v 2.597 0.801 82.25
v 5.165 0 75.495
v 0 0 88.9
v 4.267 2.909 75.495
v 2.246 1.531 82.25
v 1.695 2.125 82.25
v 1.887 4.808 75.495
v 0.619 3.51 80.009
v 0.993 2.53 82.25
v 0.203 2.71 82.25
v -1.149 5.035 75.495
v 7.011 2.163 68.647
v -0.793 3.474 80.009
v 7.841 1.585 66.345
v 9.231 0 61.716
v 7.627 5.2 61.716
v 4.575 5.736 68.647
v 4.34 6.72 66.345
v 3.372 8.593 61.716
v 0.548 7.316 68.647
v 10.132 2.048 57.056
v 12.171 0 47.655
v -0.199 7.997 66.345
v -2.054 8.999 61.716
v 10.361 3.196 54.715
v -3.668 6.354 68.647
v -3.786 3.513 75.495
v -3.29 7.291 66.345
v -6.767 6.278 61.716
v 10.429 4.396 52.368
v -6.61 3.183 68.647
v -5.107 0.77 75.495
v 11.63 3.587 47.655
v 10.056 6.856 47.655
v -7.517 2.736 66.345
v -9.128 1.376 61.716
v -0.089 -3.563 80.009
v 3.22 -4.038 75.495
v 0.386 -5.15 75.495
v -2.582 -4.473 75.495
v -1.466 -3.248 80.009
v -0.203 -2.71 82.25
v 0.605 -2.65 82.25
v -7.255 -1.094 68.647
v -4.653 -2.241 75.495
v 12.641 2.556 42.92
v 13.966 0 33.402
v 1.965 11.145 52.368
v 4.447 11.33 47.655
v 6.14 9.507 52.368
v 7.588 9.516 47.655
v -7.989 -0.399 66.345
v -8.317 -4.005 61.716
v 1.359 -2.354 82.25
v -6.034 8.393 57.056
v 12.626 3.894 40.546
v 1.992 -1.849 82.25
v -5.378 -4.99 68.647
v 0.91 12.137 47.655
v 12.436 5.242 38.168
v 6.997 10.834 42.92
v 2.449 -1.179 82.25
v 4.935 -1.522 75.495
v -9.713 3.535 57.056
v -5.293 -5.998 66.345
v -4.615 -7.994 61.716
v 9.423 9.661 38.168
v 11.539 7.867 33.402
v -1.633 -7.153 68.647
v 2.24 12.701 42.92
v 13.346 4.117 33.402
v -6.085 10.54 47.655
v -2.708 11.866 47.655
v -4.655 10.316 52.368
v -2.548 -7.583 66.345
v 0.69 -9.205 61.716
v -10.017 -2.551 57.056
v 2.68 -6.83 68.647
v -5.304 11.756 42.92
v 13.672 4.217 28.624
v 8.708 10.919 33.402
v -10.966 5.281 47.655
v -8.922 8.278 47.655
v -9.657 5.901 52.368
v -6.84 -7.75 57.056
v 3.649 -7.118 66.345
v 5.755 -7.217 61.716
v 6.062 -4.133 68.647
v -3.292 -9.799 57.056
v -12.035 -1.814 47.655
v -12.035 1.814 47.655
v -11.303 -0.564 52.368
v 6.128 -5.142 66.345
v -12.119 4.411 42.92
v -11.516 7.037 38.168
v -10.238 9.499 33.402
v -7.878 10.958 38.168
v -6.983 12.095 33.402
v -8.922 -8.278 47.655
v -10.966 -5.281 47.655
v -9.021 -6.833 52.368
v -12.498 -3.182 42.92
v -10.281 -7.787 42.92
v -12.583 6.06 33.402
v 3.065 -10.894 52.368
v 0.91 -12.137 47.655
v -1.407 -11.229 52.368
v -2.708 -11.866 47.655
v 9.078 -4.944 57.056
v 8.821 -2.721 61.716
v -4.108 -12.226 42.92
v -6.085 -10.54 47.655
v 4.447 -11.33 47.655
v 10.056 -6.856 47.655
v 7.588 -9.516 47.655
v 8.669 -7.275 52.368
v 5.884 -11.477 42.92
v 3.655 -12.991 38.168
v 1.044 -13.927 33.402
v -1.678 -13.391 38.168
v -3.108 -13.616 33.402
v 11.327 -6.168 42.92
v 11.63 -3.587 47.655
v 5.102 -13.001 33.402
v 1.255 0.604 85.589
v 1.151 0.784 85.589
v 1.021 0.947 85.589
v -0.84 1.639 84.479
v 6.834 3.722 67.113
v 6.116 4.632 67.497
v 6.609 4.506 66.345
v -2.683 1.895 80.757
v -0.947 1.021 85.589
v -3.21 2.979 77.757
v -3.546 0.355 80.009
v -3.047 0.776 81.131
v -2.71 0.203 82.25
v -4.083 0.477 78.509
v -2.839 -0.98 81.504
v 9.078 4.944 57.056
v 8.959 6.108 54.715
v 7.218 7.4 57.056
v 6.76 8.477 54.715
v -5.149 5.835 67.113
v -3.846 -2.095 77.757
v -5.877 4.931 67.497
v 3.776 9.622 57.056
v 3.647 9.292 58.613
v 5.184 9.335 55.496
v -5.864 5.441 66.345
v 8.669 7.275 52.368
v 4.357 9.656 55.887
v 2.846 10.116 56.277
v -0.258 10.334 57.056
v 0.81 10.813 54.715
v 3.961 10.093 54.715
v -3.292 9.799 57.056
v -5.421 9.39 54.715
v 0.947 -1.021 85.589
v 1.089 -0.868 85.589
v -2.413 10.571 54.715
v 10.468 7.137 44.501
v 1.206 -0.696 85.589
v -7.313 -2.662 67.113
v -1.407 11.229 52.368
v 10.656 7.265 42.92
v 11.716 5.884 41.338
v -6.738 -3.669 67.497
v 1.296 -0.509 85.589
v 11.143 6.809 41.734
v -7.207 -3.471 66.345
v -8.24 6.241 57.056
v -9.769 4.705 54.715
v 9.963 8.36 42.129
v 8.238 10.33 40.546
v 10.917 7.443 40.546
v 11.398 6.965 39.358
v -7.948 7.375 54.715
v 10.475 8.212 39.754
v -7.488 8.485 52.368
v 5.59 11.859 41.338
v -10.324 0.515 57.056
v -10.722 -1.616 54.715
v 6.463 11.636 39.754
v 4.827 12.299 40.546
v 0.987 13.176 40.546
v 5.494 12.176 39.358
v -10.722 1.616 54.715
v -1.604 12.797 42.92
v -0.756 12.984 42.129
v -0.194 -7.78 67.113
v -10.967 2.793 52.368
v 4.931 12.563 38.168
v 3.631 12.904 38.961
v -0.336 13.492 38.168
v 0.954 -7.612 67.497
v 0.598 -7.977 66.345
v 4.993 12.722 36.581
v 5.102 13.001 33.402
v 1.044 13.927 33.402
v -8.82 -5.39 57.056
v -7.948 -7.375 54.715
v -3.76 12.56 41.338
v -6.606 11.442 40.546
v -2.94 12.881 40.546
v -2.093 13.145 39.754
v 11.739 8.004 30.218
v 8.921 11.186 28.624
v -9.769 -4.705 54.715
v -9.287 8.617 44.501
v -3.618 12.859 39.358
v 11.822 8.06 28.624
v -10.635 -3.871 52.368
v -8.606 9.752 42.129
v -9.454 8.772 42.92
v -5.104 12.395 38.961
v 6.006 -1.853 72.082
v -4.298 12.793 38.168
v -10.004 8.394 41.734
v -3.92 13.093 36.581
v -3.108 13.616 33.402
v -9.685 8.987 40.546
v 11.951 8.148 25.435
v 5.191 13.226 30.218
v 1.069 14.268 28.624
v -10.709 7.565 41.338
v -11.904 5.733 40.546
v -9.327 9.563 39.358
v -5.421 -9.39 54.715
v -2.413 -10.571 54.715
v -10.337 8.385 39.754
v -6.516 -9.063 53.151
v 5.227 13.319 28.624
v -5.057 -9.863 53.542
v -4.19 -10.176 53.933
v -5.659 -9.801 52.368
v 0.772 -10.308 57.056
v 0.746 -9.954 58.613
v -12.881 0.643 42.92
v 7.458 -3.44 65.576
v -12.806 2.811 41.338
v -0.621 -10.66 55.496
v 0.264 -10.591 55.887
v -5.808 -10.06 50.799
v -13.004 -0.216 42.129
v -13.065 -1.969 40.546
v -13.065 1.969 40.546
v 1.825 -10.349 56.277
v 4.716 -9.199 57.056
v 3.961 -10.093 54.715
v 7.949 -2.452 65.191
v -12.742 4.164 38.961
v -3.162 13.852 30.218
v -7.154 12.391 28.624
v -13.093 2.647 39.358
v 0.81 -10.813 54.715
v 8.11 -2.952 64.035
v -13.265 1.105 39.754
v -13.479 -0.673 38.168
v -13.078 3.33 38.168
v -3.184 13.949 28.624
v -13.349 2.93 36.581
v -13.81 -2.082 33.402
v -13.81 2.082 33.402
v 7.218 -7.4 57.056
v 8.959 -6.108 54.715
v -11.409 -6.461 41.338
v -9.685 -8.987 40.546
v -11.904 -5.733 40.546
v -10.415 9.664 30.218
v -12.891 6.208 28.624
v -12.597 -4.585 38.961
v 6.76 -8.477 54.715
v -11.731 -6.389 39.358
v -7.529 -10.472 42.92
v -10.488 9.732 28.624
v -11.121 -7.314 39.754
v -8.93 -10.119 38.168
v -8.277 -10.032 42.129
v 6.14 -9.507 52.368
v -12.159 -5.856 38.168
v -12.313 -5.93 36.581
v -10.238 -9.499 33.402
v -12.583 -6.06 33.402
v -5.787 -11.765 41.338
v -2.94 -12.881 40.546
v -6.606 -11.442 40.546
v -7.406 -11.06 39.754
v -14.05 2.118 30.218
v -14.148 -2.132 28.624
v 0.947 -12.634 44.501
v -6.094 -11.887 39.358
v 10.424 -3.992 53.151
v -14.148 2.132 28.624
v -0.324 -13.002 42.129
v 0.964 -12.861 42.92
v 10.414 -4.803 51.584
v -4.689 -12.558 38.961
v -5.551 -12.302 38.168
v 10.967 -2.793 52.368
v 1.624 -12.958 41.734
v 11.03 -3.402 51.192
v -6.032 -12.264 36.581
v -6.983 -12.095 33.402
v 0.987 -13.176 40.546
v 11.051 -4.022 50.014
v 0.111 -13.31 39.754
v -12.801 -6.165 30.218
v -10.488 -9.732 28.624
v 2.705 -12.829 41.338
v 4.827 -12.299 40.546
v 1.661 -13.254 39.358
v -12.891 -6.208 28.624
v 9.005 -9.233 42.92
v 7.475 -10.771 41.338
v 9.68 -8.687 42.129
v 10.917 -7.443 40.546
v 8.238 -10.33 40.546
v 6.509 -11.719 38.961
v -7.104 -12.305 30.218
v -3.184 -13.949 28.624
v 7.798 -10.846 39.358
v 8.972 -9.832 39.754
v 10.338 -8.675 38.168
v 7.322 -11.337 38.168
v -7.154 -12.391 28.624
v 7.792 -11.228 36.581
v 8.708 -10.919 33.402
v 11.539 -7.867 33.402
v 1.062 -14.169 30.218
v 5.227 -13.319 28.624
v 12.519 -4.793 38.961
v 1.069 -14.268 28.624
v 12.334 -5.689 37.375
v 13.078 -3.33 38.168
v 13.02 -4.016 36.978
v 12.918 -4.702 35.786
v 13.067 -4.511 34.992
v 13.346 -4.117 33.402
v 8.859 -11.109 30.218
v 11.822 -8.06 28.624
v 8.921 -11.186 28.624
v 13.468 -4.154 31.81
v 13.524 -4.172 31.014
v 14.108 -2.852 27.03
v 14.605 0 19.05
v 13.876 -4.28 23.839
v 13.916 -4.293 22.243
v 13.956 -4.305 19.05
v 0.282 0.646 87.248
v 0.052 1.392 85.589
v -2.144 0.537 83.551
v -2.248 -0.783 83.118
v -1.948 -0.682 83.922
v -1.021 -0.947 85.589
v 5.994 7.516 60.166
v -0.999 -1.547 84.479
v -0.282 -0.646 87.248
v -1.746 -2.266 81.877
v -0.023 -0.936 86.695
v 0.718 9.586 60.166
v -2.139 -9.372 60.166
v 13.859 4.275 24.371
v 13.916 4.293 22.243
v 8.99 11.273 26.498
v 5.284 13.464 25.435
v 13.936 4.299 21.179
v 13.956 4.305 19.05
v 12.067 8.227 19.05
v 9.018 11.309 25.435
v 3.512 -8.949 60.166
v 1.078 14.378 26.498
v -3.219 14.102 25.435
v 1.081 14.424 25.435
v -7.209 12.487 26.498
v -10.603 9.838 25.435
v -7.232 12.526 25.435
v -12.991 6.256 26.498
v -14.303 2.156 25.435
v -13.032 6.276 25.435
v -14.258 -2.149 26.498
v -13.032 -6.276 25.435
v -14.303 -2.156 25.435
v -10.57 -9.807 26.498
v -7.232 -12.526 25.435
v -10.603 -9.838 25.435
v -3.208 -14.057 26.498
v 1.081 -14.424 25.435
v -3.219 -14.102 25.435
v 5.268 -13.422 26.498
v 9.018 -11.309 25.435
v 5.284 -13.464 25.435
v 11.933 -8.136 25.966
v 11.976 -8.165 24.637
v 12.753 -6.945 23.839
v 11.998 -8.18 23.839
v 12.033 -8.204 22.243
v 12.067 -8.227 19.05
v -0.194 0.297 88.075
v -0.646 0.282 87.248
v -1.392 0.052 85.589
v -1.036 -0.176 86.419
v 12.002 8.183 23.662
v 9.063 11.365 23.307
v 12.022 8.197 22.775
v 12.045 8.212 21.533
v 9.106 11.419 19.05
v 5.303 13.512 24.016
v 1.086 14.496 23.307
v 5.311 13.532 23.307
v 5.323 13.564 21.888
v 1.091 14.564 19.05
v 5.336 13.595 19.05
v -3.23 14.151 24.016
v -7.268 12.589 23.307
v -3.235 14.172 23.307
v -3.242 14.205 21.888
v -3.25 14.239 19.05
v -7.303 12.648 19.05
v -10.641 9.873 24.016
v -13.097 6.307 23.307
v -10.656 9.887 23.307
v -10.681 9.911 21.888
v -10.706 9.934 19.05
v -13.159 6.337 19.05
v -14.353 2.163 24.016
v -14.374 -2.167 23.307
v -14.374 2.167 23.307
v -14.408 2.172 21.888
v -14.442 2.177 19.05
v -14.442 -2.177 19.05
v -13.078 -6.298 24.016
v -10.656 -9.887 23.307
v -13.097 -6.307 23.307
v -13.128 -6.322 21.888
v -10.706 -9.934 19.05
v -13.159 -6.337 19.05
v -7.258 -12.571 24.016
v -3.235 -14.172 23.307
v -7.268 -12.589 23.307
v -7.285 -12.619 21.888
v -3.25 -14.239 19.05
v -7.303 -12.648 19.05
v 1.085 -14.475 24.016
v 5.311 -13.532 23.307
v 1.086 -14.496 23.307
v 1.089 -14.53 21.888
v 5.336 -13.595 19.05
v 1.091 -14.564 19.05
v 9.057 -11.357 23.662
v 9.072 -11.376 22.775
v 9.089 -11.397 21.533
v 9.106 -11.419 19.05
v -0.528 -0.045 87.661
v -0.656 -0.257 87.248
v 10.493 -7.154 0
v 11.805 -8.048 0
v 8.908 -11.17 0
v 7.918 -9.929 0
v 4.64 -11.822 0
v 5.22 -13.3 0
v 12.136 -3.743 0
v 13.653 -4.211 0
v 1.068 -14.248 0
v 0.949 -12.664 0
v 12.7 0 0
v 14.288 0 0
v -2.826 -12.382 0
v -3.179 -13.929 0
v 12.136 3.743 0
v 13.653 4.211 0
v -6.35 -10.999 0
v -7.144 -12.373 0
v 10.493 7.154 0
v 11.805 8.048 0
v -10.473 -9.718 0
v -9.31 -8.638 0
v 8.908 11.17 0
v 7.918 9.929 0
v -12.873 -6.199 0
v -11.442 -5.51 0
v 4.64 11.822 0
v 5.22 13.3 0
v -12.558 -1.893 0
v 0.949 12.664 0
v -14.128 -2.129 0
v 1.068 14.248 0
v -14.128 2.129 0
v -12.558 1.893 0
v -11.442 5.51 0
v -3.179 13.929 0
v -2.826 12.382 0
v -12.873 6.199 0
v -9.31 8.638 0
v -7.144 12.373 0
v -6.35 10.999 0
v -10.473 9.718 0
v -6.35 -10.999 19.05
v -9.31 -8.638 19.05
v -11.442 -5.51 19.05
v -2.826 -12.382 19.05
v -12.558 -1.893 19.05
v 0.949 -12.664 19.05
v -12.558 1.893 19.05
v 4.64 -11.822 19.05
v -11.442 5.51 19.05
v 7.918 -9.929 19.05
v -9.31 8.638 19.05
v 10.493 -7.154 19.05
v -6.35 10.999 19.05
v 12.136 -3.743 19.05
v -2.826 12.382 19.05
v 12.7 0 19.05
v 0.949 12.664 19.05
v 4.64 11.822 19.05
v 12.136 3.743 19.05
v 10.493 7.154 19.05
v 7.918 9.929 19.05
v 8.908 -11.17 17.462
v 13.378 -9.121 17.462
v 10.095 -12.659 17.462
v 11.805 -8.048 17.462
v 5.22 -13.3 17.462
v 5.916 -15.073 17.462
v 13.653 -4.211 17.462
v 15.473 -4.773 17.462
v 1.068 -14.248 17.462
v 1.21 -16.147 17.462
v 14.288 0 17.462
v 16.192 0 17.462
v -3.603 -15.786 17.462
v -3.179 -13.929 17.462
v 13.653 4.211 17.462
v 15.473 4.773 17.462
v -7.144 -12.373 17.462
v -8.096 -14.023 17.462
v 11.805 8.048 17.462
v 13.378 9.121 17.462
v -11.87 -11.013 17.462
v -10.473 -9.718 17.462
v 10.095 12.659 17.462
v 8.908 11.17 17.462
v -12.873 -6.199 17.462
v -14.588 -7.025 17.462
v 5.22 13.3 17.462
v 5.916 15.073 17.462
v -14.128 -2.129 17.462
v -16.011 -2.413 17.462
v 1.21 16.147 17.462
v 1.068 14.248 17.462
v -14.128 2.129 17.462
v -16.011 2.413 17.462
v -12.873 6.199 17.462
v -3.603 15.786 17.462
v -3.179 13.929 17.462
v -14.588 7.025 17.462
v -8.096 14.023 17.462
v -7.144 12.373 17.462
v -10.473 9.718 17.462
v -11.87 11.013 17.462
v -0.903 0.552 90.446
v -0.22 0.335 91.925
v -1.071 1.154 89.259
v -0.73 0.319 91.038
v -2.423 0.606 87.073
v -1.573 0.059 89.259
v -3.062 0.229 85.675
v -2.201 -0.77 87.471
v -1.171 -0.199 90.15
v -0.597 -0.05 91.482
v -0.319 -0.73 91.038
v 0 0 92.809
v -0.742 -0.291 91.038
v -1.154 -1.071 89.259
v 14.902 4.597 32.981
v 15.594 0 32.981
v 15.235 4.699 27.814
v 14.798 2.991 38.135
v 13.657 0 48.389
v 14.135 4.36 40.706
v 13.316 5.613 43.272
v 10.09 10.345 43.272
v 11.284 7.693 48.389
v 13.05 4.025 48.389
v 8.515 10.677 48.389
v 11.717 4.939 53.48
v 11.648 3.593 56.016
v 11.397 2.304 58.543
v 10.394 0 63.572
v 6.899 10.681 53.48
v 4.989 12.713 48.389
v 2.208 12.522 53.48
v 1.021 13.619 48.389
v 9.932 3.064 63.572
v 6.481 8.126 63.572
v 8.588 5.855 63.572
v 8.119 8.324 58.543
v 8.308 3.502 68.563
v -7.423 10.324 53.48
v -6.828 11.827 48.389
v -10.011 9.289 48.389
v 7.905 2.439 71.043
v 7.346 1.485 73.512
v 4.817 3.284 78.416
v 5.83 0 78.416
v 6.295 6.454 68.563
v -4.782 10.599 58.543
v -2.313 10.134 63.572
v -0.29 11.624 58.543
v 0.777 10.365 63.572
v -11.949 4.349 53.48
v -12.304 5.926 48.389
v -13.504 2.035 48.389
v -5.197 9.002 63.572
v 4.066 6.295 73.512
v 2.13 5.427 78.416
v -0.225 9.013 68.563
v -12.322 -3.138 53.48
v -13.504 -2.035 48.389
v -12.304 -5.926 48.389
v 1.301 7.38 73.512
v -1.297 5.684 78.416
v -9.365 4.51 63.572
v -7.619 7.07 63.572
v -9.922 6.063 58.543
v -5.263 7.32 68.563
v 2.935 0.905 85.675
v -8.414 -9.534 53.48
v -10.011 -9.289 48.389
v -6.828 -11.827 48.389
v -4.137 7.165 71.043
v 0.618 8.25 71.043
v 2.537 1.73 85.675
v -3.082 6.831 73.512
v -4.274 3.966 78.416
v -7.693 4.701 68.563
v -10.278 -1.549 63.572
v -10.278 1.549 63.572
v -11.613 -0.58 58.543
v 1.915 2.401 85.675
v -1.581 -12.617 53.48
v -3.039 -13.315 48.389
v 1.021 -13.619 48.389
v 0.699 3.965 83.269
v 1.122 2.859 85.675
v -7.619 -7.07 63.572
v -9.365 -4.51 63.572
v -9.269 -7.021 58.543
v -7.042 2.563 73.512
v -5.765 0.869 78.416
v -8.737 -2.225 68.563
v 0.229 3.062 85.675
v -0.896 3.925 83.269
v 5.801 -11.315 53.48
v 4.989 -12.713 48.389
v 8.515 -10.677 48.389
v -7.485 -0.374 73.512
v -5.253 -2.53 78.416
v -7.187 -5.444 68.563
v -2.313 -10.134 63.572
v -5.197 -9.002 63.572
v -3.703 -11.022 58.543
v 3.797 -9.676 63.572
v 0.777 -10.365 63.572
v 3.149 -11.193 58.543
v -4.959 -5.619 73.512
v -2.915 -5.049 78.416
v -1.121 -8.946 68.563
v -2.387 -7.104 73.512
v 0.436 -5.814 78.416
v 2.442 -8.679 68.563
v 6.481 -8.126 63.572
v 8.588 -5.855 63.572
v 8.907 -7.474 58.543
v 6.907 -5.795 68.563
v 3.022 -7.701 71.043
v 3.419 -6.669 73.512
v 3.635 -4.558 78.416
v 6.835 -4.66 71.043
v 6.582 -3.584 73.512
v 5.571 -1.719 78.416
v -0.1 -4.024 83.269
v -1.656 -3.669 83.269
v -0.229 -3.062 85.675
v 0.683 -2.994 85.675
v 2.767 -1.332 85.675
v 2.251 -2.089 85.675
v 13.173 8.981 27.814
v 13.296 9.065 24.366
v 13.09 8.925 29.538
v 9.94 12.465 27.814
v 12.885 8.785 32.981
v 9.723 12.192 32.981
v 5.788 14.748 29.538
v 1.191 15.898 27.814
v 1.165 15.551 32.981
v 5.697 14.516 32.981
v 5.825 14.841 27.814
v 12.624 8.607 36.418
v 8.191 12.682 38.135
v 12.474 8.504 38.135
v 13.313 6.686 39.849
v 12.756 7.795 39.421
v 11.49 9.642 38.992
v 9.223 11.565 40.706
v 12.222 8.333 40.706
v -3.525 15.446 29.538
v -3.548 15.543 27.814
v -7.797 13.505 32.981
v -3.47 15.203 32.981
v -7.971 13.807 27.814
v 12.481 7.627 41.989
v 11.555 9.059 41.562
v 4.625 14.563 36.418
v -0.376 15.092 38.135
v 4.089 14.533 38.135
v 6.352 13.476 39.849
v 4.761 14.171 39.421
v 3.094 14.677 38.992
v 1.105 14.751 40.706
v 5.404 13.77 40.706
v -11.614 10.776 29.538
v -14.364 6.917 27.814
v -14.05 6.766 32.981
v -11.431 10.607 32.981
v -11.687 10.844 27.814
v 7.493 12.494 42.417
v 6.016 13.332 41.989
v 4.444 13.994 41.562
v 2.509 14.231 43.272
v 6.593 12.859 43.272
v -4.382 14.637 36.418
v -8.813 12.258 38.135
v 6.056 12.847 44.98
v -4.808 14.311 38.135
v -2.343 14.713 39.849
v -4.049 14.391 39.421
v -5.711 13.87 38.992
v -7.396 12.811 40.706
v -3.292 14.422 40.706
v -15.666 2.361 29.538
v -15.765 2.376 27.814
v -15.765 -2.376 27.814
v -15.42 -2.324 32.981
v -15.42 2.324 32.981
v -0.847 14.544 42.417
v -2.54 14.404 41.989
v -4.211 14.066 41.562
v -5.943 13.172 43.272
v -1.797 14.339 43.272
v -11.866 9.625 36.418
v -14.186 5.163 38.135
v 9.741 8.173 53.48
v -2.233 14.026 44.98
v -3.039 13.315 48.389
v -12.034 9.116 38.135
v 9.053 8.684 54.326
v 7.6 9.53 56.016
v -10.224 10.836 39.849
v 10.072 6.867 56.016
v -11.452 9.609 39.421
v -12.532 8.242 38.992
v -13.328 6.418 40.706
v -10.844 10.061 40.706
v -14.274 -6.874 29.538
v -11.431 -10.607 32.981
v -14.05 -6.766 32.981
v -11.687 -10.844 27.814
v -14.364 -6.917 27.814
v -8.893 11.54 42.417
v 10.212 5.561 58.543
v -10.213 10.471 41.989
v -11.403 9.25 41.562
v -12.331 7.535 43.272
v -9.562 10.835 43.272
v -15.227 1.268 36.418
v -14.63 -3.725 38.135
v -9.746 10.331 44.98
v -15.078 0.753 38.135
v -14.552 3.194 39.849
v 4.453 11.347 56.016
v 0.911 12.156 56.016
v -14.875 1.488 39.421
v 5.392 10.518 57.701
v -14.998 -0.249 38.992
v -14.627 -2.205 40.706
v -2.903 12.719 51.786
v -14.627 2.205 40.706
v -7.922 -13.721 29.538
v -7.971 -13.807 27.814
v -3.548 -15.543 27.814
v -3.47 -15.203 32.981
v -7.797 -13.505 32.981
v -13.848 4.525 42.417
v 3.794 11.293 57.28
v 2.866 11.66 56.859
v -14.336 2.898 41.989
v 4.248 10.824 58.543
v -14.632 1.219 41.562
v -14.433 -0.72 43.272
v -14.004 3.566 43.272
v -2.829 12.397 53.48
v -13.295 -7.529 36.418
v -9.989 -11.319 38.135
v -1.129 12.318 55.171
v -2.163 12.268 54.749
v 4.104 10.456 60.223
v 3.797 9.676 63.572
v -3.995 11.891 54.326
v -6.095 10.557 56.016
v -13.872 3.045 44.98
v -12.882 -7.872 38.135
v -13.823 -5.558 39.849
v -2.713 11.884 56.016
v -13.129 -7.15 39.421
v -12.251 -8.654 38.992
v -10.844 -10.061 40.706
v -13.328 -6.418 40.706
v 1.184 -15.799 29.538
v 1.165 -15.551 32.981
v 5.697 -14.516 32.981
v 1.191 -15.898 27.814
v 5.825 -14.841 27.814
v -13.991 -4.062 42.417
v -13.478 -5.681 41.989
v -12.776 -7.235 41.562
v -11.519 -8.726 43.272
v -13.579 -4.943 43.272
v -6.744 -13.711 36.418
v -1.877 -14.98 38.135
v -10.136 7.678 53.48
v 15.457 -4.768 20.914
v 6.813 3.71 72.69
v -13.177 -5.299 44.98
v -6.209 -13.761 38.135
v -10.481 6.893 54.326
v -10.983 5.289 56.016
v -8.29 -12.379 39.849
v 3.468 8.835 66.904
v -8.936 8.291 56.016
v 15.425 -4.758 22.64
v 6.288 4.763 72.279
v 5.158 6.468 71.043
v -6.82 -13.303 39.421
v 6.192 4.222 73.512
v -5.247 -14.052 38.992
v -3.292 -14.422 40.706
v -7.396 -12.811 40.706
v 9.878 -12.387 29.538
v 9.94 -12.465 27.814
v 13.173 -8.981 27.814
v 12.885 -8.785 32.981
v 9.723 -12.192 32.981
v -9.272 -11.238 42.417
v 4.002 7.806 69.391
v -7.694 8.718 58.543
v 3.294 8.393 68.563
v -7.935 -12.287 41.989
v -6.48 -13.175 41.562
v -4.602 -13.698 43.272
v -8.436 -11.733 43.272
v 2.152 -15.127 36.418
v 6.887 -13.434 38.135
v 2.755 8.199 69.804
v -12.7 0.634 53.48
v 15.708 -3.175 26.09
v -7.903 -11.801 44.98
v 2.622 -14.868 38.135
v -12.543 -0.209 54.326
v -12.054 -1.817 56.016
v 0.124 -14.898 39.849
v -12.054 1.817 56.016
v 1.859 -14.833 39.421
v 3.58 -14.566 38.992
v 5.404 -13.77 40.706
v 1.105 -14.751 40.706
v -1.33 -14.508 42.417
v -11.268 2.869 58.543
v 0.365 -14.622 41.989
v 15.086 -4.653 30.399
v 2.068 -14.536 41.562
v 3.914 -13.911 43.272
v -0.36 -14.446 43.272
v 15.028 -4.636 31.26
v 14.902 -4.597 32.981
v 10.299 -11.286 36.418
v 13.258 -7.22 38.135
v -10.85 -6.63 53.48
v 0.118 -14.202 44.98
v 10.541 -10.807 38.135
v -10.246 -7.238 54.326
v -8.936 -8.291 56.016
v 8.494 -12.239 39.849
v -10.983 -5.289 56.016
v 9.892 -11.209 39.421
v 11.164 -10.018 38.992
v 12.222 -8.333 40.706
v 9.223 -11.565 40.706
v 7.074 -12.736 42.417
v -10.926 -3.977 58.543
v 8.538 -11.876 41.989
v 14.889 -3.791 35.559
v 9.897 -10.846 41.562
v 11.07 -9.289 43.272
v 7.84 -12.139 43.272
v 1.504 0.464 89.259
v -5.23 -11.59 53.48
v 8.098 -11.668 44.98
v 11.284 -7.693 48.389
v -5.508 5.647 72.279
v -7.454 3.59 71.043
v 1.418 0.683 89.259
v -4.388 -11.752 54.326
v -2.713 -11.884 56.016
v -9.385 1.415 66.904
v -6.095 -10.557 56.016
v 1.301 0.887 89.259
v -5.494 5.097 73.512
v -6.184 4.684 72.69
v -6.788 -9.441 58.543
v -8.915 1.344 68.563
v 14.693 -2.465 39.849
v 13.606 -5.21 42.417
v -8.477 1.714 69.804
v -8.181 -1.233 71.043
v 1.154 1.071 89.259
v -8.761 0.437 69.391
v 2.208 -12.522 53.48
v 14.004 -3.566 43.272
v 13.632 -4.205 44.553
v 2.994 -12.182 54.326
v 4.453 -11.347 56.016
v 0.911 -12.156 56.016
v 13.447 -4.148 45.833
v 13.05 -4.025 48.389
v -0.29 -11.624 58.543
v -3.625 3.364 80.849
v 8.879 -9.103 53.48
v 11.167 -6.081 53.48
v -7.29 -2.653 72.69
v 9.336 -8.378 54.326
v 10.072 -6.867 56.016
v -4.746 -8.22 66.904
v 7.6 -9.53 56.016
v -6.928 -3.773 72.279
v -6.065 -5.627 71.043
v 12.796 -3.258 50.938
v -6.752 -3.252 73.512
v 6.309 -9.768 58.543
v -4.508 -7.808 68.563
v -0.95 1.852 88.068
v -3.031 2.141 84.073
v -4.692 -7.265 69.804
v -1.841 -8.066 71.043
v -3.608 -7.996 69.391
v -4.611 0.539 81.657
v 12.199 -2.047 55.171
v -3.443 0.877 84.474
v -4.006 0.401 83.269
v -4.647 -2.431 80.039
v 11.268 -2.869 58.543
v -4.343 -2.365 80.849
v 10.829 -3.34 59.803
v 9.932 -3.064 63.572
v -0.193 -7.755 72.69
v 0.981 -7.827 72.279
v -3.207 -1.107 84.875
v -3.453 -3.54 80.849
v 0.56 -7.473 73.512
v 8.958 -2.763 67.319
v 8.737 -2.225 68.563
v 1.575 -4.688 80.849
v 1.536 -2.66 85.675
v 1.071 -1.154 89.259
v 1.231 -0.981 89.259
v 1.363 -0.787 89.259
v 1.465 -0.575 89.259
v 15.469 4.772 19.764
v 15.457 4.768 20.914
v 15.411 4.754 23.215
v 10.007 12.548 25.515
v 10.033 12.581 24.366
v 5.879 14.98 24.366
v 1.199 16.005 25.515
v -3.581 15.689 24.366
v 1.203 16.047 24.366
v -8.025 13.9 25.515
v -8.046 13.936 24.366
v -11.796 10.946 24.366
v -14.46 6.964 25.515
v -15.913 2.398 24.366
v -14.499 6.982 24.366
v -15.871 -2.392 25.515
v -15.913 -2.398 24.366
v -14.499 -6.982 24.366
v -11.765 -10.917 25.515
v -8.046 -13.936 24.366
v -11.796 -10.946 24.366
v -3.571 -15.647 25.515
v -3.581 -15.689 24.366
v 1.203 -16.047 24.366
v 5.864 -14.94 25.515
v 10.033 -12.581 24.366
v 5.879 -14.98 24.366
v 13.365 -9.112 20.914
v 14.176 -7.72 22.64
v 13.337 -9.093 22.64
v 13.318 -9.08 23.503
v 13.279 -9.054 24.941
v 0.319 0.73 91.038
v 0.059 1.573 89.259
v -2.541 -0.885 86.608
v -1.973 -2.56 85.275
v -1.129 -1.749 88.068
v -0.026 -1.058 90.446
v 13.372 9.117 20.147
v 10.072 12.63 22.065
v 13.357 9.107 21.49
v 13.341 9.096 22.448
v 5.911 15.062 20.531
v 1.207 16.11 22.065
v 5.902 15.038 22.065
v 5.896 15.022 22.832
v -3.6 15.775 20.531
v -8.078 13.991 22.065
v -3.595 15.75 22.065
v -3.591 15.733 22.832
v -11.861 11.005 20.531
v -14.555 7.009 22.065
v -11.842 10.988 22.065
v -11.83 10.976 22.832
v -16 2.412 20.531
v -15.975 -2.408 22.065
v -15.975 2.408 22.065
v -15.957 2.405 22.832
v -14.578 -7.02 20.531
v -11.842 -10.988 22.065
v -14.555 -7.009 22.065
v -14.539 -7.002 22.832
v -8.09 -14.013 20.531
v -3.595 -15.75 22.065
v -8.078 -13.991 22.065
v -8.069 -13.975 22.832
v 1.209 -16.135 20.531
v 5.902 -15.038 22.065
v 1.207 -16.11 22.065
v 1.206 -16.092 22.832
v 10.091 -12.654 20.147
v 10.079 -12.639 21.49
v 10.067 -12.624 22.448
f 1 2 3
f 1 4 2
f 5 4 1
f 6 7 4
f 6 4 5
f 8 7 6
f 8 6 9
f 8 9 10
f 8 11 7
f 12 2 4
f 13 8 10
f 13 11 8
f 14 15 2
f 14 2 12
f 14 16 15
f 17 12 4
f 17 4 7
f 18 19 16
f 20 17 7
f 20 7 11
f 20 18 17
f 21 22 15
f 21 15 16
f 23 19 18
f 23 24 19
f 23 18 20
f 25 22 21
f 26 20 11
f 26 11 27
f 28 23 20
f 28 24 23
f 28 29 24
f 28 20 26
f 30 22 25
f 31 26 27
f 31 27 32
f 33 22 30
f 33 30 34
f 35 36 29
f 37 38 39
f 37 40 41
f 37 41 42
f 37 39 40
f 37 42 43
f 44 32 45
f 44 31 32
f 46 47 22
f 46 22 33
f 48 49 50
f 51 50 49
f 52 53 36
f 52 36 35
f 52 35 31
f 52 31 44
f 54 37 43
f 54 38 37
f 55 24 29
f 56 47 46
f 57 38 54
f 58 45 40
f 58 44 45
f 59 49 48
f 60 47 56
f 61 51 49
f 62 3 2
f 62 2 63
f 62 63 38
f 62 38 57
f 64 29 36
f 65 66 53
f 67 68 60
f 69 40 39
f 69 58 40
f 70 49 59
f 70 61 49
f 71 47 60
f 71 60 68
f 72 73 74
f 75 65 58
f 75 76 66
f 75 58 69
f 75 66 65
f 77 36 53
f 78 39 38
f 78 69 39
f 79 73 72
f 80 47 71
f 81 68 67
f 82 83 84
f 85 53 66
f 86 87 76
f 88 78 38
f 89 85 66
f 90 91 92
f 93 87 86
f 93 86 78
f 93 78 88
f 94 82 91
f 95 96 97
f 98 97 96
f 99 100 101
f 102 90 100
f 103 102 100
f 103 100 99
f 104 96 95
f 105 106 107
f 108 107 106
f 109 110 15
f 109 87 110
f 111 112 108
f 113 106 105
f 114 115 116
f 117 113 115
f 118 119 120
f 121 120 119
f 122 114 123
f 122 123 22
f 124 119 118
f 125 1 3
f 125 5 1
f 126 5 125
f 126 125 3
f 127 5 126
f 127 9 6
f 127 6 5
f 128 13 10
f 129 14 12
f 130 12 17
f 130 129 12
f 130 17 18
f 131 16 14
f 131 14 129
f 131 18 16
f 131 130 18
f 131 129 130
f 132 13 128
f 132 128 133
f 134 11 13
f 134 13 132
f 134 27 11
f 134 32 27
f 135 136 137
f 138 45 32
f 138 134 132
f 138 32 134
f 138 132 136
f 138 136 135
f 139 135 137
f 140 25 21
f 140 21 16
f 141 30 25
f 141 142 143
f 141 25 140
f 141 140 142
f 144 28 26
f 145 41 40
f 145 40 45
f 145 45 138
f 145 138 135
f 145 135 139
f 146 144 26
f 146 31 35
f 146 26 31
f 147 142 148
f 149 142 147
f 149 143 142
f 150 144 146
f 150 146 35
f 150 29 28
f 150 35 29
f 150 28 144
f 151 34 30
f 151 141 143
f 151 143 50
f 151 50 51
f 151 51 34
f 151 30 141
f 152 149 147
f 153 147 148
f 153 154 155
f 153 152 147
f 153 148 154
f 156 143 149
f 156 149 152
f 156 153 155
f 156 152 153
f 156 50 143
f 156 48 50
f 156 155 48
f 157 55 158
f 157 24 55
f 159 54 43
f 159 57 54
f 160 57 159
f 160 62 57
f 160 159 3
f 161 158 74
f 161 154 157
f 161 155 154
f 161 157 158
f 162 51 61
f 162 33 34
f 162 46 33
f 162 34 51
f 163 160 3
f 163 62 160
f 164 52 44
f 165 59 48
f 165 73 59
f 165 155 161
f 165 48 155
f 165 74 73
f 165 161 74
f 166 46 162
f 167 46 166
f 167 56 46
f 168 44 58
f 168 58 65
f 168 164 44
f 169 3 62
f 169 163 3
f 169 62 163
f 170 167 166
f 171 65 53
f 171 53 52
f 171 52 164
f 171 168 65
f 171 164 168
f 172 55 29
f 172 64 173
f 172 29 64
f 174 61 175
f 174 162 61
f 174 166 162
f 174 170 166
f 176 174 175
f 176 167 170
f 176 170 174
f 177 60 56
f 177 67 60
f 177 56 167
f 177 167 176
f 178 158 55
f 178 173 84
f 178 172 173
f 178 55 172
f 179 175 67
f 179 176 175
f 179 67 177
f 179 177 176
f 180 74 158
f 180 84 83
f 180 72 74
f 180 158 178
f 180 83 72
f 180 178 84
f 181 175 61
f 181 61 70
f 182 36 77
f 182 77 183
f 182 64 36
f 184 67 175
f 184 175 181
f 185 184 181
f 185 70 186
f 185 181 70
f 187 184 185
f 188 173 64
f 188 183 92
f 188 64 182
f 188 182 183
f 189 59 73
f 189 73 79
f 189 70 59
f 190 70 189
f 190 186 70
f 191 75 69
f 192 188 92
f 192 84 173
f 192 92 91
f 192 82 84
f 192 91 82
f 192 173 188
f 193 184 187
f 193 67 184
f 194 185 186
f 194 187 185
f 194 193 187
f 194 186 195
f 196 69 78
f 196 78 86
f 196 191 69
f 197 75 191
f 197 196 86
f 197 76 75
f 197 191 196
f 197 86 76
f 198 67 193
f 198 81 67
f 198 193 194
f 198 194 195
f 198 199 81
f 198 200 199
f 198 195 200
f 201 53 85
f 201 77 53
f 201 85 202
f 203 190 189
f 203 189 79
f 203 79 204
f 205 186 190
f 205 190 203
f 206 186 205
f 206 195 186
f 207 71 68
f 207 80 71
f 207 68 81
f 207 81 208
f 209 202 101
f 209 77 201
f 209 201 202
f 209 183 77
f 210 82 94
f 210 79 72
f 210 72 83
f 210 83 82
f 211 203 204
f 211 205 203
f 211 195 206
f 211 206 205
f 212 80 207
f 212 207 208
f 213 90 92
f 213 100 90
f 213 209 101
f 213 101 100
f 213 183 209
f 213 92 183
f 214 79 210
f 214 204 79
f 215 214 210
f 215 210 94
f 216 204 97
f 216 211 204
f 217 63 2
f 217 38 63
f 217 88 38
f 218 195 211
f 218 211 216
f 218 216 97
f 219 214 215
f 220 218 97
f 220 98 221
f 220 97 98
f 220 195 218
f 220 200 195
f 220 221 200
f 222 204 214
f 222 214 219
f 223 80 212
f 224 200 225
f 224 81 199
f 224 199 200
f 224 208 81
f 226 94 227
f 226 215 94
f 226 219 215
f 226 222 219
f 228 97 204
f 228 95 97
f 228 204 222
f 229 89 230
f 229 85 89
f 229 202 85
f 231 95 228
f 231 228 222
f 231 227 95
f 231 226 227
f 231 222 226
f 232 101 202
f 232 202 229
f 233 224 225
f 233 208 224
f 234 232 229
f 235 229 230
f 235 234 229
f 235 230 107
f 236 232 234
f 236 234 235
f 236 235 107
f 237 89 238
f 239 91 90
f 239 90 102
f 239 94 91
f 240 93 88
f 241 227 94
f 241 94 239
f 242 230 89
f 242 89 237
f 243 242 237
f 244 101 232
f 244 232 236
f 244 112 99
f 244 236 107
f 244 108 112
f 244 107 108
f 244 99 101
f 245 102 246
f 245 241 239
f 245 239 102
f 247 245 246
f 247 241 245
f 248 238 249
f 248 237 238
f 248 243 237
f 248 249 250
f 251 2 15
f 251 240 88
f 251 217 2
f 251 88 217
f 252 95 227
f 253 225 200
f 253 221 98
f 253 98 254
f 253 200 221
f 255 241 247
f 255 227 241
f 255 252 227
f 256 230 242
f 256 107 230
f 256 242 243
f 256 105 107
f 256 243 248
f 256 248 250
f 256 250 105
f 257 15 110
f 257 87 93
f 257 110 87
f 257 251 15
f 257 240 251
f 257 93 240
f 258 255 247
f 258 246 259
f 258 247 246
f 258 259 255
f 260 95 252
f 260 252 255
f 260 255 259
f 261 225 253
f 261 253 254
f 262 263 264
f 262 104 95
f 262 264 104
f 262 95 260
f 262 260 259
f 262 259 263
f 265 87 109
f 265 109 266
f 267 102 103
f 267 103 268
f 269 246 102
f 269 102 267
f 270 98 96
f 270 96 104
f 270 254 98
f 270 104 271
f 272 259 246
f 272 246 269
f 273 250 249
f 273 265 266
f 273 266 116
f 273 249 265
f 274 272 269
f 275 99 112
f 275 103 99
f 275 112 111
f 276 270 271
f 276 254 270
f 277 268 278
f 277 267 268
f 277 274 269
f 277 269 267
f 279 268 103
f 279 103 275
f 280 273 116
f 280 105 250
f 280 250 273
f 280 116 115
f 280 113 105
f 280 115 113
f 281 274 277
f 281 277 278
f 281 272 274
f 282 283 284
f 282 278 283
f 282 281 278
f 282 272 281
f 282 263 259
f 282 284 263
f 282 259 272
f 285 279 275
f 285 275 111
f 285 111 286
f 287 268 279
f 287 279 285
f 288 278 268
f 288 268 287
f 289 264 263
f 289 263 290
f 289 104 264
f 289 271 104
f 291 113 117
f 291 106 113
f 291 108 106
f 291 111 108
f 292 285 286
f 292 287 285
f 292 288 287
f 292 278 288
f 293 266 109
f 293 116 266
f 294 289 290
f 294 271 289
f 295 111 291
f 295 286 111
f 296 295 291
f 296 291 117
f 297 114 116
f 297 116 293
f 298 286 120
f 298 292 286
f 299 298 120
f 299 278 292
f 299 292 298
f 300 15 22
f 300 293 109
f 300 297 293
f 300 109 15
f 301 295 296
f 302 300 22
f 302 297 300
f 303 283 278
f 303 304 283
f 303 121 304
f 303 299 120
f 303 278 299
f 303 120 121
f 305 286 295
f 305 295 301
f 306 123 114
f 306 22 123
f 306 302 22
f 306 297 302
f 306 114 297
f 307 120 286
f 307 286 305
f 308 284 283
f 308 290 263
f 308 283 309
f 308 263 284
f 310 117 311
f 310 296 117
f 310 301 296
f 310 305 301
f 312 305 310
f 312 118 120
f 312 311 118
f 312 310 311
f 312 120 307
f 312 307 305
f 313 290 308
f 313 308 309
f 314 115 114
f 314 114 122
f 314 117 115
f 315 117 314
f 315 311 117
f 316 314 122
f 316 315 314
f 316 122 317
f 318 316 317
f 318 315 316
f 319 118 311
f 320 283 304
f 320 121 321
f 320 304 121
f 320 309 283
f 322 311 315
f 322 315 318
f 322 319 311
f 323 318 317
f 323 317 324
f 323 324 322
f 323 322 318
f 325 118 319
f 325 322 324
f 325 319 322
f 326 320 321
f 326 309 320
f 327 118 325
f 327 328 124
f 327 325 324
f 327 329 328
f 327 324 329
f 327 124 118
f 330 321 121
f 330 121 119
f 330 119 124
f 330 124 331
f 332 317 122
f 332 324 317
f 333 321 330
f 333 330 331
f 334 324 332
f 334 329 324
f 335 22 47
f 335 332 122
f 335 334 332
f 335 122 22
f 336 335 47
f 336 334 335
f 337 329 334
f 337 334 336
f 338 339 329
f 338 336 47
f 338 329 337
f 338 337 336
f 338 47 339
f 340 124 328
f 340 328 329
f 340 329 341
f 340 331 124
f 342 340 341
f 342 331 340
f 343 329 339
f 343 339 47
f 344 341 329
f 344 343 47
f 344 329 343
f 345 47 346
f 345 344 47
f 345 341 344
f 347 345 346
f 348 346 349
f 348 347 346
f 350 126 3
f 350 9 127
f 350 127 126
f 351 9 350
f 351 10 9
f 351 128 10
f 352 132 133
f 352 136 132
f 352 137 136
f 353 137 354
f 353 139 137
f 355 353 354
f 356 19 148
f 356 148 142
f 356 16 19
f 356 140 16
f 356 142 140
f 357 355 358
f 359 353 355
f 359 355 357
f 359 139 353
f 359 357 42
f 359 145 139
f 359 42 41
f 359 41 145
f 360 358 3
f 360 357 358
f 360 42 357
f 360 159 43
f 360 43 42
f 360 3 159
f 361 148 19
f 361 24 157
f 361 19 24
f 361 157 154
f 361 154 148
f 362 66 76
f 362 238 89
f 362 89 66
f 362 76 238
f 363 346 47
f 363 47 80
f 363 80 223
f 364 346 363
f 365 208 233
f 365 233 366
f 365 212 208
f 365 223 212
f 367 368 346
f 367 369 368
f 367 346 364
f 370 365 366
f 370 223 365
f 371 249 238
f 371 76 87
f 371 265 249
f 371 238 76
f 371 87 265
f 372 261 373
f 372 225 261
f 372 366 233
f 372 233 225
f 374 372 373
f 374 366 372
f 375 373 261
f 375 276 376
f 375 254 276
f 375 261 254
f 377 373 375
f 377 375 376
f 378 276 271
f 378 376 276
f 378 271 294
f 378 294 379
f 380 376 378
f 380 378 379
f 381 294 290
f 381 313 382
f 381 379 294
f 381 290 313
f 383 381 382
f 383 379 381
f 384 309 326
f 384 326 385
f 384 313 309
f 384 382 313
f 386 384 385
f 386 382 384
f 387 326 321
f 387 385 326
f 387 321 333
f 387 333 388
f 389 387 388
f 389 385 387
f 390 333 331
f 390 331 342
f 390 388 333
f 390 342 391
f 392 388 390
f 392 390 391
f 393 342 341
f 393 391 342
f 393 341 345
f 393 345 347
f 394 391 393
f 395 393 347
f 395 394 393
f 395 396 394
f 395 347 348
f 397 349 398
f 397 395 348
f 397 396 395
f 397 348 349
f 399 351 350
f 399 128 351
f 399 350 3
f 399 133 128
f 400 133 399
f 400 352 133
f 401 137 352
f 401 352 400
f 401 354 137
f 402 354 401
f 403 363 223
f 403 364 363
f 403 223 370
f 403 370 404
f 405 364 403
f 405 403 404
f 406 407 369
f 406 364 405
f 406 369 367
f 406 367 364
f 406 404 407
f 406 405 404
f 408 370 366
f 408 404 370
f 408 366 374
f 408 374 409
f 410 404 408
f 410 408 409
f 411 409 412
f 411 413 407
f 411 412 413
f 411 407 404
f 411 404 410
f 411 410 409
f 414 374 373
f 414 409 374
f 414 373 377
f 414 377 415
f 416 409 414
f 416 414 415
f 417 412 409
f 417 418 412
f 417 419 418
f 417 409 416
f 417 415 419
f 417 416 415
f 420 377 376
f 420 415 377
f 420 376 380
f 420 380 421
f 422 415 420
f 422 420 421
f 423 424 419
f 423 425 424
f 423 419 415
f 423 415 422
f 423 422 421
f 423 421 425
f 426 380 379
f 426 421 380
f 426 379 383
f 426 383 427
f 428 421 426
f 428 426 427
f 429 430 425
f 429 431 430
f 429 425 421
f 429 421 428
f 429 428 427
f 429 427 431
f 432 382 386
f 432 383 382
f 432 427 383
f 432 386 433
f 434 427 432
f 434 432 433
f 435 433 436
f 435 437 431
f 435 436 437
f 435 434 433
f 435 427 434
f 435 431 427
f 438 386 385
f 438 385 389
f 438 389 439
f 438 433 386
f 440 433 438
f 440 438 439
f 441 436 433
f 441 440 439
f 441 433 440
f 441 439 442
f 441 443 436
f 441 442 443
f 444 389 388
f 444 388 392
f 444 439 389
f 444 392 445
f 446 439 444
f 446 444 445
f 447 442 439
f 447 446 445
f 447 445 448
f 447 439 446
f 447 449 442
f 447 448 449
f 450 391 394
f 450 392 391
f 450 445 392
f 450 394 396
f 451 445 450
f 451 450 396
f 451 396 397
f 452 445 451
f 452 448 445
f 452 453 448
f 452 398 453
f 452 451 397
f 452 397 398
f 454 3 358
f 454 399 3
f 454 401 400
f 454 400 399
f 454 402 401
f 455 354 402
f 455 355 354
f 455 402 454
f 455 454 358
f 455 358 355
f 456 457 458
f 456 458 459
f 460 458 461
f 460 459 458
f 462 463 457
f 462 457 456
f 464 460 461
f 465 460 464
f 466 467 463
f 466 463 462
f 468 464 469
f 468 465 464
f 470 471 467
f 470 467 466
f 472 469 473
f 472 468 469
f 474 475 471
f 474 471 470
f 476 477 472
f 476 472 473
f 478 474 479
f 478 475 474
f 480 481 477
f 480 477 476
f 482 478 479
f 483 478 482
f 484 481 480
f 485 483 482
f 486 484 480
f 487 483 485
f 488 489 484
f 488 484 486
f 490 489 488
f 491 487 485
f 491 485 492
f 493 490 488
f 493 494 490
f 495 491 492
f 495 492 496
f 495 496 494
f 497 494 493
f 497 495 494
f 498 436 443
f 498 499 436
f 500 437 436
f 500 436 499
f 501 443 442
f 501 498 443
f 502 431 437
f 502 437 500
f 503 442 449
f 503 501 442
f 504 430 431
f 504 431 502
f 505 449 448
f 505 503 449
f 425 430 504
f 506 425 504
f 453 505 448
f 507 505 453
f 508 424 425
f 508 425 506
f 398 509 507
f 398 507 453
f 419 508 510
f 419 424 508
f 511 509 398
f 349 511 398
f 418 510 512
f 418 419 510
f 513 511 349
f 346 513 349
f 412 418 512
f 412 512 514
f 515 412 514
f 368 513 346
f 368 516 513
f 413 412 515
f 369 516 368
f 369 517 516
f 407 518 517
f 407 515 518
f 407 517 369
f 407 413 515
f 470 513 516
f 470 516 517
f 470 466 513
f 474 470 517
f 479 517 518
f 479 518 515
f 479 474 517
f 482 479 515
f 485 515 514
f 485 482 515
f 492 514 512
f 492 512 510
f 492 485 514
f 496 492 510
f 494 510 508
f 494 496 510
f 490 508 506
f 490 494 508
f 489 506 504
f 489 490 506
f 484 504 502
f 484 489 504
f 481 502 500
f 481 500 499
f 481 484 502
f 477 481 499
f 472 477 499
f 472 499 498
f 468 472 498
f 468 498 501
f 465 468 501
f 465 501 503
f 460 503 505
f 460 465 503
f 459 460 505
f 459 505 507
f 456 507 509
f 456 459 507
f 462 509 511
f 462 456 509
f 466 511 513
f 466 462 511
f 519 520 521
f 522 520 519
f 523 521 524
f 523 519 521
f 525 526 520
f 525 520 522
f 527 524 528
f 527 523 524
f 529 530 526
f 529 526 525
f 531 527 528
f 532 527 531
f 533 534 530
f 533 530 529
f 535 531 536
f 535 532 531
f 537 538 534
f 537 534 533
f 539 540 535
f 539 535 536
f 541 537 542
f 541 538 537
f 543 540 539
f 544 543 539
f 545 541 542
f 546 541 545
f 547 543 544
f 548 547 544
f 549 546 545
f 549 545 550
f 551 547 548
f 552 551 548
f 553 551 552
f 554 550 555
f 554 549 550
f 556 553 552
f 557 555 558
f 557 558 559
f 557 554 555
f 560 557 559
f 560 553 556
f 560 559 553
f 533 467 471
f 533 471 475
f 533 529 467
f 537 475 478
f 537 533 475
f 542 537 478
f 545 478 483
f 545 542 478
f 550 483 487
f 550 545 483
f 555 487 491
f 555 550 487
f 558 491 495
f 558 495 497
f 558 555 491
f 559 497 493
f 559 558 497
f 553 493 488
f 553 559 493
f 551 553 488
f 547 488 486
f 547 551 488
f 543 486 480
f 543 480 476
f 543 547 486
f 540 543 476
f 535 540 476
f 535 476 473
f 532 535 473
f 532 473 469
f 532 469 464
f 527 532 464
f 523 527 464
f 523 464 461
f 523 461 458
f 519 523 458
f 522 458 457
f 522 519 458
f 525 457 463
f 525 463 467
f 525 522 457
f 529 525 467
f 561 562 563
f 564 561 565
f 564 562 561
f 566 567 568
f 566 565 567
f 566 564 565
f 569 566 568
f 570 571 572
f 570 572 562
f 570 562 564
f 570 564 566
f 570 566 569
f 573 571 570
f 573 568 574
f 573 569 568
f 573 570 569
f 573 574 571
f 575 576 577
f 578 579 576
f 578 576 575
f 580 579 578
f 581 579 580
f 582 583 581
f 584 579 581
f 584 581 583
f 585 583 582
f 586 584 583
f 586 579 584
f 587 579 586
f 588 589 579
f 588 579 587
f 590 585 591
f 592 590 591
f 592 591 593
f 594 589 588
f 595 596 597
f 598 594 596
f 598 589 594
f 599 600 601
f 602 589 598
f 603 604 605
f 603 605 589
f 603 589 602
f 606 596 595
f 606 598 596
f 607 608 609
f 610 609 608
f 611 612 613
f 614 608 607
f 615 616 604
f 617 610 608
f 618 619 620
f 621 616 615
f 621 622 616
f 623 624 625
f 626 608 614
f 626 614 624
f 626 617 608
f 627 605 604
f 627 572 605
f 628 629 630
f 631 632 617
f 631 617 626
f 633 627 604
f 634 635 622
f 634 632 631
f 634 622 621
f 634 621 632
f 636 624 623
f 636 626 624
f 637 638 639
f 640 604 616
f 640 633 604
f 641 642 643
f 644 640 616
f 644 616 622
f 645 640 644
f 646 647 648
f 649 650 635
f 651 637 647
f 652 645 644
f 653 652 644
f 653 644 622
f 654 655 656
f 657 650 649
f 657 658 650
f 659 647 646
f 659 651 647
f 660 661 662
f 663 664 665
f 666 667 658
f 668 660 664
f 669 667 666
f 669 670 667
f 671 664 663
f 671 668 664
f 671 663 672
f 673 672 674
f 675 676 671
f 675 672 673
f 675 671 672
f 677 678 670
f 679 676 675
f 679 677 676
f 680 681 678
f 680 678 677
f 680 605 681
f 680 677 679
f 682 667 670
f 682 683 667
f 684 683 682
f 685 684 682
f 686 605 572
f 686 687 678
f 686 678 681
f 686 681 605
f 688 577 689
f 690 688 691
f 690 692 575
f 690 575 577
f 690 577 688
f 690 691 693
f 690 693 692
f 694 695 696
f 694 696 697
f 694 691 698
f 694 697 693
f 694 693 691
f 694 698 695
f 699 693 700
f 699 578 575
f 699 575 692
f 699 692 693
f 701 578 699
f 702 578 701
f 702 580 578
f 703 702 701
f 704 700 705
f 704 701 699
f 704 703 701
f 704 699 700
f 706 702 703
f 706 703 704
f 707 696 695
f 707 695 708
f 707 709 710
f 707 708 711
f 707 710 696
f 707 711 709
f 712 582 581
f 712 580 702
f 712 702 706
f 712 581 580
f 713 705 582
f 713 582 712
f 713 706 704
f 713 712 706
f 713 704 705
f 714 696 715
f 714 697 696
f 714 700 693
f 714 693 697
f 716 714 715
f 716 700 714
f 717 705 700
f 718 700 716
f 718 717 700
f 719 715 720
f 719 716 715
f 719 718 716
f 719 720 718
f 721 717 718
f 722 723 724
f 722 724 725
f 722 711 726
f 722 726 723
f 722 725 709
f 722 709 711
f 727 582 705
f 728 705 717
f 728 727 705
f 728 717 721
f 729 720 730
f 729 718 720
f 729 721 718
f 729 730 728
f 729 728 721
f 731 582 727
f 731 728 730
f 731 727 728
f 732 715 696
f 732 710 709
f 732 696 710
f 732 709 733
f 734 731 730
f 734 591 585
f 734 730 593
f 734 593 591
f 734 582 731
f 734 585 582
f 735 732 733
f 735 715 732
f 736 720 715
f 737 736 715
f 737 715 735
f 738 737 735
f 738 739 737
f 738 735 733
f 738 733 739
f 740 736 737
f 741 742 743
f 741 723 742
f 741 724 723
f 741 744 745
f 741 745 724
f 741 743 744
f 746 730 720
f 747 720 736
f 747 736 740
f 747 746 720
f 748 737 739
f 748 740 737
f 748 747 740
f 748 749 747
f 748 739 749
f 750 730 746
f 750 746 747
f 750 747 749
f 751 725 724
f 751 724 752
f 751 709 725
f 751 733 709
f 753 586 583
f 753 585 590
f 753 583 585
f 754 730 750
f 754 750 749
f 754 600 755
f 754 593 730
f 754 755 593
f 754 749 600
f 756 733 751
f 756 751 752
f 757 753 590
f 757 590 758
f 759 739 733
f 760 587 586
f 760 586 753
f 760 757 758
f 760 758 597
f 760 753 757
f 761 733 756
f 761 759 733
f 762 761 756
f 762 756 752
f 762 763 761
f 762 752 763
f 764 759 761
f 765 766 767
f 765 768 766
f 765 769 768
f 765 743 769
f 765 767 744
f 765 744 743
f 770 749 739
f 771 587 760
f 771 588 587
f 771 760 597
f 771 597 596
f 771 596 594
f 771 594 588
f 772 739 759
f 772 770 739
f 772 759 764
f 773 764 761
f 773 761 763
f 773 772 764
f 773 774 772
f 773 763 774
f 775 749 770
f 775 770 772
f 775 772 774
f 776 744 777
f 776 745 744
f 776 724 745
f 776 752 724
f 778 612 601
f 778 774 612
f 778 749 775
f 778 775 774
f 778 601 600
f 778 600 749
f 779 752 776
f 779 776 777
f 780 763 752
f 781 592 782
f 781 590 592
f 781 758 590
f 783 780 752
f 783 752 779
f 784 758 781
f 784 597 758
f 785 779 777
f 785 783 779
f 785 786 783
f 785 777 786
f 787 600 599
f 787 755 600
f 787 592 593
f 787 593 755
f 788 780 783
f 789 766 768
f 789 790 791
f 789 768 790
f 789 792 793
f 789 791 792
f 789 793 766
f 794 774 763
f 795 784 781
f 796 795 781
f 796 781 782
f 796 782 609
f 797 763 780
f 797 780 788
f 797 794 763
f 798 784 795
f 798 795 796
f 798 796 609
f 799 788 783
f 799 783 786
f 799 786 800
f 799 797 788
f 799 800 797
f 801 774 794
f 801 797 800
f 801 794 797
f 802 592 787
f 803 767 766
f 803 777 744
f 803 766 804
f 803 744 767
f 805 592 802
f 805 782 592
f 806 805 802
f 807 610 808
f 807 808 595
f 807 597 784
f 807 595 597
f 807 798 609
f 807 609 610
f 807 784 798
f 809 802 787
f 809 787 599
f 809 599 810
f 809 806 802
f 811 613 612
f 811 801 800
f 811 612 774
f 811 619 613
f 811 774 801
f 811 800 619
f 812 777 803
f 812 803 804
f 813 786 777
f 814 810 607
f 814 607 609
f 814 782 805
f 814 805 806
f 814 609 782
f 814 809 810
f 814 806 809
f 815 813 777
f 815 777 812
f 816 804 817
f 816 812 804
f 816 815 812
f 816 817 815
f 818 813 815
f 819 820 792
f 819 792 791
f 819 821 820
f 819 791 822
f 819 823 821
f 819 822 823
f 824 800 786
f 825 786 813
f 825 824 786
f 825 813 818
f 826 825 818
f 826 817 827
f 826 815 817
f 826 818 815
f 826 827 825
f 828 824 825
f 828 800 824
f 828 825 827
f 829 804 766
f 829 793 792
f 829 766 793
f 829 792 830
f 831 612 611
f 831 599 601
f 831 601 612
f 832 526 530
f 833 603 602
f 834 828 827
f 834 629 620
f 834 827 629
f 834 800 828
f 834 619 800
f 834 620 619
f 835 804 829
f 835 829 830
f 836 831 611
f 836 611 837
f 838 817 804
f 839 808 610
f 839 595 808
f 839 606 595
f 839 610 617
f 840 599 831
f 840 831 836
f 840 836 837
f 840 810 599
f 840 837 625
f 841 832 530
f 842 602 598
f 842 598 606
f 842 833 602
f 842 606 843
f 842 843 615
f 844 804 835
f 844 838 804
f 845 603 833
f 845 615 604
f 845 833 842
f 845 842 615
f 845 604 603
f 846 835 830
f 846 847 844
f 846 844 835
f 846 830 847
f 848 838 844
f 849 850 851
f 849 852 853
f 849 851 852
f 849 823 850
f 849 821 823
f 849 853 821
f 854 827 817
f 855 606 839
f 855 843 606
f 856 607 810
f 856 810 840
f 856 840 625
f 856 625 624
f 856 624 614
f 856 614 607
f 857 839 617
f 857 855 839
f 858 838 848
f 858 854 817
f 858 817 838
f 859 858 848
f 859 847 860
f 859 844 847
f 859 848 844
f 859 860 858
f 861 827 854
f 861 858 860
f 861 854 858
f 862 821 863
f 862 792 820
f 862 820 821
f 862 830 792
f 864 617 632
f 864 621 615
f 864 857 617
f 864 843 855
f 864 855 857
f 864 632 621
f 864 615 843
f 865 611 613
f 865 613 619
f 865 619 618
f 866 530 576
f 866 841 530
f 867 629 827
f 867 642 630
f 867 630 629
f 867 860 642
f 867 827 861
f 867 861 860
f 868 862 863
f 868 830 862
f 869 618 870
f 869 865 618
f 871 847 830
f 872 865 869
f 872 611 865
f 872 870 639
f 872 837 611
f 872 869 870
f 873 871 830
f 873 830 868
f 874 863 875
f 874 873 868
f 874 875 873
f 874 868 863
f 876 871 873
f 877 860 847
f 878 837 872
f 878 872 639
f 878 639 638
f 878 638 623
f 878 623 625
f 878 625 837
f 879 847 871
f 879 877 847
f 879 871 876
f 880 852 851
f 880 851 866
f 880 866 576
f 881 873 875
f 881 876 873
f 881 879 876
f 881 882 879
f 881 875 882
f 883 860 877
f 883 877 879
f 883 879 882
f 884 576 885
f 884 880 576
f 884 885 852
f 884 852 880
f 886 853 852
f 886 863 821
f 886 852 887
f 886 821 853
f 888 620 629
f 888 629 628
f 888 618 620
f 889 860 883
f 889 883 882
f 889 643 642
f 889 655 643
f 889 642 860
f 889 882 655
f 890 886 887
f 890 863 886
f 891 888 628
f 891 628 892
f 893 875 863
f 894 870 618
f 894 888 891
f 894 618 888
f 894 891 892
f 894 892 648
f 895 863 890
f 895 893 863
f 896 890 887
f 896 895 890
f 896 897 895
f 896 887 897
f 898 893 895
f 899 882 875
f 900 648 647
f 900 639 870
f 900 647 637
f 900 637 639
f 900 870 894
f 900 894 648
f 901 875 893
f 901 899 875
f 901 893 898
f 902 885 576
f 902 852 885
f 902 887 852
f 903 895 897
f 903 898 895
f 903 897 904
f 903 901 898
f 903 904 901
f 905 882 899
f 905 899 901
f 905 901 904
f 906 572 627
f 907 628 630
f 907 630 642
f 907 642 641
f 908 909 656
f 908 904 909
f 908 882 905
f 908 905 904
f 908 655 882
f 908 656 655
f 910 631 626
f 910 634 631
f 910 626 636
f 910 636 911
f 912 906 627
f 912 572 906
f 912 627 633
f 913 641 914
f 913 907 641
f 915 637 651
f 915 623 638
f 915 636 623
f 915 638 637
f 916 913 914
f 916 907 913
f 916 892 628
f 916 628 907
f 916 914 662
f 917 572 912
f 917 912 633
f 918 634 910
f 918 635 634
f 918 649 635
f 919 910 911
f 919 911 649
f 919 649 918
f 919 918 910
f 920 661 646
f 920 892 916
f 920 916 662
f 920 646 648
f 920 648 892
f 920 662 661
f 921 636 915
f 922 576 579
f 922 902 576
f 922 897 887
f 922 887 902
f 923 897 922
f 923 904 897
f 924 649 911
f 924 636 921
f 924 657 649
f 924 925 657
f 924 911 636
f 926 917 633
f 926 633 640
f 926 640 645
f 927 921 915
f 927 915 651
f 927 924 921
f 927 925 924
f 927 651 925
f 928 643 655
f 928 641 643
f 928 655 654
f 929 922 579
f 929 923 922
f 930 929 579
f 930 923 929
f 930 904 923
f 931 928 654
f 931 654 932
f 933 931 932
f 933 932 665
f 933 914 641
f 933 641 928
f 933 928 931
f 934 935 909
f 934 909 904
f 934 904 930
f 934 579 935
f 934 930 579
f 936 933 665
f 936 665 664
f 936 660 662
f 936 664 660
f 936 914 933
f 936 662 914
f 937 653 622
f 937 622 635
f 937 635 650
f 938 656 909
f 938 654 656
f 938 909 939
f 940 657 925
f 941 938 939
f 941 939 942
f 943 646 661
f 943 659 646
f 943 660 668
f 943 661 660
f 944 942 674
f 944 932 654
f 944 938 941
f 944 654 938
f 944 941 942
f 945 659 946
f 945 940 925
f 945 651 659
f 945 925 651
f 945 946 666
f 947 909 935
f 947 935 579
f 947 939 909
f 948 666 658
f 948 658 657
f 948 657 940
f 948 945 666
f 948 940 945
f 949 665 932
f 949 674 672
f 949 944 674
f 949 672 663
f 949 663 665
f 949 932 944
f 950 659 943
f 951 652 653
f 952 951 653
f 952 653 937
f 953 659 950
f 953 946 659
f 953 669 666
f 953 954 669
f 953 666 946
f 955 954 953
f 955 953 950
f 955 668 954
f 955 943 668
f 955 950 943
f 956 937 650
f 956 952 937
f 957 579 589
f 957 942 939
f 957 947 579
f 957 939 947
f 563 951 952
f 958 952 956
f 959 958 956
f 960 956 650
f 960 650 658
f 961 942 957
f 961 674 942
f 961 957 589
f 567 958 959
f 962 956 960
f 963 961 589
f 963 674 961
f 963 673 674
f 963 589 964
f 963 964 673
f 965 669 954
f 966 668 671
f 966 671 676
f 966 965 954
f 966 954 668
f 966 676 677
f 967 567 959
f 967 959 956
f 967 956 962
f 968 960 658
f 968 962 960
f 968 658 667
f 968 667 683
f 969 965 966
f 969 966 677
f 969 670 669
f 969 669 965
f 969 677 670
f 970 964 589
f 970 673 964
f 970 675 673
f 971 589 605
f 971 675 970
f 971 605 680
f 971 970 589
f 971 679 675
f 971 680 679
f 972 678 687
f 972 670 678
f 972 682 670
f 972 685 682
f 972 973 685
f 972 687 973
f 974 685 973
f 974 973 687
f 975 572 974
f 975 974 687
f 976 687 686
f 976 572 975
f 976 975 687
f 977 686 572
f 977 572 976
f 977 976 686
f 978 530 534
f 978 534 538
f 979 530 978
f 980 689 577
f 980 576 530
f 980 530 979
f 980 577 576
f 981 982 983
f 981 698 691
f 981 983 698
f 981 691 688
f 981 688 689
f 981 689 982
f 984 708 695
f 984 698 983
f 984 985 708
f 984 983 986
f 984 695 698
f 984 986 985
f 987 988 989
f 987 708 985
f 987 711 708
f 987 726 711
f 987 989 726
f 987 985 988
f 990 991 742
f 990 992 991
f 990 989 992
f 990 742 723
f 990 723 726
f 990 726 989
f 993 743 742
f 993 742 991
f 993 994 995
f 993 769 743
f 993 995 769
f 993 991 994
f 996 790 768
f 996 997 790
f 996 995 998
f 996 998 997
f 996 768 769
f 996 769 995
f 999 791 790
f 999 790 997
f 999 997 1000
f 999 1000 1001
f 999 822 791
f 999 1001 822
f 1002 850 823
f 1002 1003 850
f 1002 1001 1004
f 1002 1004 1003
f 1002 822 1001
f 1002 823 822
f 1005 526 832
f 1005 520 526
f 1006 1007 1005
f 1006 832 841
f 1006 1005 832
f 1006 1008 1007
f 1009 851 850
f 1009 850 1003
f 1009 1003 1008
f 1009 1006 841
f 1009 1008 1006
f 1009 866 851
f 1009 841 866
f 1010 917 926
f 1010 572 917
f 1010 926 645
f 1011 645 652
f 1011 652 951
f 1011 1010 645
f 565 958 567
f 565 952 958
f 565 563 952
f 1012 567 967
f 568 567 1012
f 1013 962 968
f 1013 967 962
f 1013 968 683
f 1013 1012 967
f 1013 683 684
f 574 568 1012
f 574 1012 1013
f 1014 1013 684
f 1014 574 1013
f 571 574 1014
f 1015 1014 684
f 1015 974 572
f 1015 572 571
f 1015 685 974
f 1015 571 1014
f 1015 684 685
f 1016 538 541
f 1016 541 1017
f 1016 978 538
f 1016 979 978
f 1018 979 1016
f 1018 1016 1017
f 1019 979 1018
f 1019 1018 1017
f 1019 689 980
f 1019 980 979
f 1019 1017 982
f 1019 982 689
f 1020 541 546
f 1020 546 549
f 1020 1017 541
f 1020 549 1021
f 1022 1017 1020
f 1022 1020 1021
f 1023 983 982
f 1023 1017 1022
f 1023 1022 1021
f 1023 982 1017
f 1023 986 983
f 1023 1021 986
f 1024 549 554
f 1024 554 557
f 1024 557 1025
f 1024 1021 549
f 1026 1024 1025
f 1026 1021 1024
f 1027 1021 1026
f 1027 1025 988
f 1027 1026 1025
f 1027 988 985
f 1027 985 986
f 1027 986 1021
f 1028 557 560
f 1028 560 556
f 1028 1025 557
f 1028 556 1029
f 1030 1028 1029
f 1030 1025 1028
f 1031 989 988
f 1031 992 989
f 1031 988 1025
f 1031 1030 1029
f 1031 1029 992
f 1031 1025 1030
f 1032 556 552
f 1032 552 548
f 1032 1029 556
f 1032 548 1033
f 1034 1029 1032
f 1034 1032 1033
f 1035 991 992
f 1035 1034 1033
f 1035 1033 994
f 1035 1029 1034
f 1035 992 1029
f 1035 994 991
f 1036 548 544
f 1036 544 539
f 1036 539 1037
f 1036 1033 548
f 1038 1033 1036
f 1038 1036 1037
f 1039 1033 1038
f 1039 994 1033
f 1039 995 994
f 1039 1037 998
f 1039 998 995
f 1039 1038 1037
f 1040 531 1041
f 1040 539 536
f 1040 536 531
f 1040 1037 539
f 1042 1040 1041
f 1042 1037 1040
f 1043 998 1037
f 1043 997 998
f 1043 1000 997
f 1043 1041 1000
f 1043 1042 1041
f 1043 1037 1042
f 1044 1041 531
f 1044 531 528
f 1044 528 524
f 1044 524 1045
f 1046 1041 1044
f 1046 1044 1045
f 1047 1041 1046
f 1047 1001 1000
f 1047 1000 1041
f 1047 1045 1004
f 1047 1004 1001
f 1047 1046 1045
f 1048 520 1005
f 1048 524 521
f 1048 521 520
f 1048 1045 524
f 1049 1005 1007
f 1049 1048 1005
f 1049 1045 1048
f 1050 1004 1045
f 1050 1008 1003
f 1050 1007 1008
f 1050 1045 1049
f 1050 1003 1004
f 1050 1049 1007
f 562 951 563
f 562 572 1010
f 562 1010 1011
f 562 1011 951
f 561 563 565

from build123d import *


with BuildPart() as f1:
    # F0 (on Front) → F1 (revolve)
    with BuildSketch(Plane.XZ):
        with BuildLine():
            Line((0, 92.80904), (0, 88.9))
            ThreePointArc((0, 88.9), (10.842822, 54.715249), (14.605, 19.05))
            Line((14.605, 19.05), (12.7, 19.05))
            Line((12.7, 19.05), (12.7, 0))
            Line((12.7, 0), (14.2875, 0))
            Line((14.2875, 0), (14.2875, 17.4625))
            Line((14.2875, 17.4625), (16.191897, 17.4625))
            ThreePointArc((16.191897, 17.4625), (12.189938, 56.015564), (0, 92.80904))
        make_face()
    revolve(axis=Axis((0, 0, 44.45), (0, 0, 1)))


solid = f1.part
